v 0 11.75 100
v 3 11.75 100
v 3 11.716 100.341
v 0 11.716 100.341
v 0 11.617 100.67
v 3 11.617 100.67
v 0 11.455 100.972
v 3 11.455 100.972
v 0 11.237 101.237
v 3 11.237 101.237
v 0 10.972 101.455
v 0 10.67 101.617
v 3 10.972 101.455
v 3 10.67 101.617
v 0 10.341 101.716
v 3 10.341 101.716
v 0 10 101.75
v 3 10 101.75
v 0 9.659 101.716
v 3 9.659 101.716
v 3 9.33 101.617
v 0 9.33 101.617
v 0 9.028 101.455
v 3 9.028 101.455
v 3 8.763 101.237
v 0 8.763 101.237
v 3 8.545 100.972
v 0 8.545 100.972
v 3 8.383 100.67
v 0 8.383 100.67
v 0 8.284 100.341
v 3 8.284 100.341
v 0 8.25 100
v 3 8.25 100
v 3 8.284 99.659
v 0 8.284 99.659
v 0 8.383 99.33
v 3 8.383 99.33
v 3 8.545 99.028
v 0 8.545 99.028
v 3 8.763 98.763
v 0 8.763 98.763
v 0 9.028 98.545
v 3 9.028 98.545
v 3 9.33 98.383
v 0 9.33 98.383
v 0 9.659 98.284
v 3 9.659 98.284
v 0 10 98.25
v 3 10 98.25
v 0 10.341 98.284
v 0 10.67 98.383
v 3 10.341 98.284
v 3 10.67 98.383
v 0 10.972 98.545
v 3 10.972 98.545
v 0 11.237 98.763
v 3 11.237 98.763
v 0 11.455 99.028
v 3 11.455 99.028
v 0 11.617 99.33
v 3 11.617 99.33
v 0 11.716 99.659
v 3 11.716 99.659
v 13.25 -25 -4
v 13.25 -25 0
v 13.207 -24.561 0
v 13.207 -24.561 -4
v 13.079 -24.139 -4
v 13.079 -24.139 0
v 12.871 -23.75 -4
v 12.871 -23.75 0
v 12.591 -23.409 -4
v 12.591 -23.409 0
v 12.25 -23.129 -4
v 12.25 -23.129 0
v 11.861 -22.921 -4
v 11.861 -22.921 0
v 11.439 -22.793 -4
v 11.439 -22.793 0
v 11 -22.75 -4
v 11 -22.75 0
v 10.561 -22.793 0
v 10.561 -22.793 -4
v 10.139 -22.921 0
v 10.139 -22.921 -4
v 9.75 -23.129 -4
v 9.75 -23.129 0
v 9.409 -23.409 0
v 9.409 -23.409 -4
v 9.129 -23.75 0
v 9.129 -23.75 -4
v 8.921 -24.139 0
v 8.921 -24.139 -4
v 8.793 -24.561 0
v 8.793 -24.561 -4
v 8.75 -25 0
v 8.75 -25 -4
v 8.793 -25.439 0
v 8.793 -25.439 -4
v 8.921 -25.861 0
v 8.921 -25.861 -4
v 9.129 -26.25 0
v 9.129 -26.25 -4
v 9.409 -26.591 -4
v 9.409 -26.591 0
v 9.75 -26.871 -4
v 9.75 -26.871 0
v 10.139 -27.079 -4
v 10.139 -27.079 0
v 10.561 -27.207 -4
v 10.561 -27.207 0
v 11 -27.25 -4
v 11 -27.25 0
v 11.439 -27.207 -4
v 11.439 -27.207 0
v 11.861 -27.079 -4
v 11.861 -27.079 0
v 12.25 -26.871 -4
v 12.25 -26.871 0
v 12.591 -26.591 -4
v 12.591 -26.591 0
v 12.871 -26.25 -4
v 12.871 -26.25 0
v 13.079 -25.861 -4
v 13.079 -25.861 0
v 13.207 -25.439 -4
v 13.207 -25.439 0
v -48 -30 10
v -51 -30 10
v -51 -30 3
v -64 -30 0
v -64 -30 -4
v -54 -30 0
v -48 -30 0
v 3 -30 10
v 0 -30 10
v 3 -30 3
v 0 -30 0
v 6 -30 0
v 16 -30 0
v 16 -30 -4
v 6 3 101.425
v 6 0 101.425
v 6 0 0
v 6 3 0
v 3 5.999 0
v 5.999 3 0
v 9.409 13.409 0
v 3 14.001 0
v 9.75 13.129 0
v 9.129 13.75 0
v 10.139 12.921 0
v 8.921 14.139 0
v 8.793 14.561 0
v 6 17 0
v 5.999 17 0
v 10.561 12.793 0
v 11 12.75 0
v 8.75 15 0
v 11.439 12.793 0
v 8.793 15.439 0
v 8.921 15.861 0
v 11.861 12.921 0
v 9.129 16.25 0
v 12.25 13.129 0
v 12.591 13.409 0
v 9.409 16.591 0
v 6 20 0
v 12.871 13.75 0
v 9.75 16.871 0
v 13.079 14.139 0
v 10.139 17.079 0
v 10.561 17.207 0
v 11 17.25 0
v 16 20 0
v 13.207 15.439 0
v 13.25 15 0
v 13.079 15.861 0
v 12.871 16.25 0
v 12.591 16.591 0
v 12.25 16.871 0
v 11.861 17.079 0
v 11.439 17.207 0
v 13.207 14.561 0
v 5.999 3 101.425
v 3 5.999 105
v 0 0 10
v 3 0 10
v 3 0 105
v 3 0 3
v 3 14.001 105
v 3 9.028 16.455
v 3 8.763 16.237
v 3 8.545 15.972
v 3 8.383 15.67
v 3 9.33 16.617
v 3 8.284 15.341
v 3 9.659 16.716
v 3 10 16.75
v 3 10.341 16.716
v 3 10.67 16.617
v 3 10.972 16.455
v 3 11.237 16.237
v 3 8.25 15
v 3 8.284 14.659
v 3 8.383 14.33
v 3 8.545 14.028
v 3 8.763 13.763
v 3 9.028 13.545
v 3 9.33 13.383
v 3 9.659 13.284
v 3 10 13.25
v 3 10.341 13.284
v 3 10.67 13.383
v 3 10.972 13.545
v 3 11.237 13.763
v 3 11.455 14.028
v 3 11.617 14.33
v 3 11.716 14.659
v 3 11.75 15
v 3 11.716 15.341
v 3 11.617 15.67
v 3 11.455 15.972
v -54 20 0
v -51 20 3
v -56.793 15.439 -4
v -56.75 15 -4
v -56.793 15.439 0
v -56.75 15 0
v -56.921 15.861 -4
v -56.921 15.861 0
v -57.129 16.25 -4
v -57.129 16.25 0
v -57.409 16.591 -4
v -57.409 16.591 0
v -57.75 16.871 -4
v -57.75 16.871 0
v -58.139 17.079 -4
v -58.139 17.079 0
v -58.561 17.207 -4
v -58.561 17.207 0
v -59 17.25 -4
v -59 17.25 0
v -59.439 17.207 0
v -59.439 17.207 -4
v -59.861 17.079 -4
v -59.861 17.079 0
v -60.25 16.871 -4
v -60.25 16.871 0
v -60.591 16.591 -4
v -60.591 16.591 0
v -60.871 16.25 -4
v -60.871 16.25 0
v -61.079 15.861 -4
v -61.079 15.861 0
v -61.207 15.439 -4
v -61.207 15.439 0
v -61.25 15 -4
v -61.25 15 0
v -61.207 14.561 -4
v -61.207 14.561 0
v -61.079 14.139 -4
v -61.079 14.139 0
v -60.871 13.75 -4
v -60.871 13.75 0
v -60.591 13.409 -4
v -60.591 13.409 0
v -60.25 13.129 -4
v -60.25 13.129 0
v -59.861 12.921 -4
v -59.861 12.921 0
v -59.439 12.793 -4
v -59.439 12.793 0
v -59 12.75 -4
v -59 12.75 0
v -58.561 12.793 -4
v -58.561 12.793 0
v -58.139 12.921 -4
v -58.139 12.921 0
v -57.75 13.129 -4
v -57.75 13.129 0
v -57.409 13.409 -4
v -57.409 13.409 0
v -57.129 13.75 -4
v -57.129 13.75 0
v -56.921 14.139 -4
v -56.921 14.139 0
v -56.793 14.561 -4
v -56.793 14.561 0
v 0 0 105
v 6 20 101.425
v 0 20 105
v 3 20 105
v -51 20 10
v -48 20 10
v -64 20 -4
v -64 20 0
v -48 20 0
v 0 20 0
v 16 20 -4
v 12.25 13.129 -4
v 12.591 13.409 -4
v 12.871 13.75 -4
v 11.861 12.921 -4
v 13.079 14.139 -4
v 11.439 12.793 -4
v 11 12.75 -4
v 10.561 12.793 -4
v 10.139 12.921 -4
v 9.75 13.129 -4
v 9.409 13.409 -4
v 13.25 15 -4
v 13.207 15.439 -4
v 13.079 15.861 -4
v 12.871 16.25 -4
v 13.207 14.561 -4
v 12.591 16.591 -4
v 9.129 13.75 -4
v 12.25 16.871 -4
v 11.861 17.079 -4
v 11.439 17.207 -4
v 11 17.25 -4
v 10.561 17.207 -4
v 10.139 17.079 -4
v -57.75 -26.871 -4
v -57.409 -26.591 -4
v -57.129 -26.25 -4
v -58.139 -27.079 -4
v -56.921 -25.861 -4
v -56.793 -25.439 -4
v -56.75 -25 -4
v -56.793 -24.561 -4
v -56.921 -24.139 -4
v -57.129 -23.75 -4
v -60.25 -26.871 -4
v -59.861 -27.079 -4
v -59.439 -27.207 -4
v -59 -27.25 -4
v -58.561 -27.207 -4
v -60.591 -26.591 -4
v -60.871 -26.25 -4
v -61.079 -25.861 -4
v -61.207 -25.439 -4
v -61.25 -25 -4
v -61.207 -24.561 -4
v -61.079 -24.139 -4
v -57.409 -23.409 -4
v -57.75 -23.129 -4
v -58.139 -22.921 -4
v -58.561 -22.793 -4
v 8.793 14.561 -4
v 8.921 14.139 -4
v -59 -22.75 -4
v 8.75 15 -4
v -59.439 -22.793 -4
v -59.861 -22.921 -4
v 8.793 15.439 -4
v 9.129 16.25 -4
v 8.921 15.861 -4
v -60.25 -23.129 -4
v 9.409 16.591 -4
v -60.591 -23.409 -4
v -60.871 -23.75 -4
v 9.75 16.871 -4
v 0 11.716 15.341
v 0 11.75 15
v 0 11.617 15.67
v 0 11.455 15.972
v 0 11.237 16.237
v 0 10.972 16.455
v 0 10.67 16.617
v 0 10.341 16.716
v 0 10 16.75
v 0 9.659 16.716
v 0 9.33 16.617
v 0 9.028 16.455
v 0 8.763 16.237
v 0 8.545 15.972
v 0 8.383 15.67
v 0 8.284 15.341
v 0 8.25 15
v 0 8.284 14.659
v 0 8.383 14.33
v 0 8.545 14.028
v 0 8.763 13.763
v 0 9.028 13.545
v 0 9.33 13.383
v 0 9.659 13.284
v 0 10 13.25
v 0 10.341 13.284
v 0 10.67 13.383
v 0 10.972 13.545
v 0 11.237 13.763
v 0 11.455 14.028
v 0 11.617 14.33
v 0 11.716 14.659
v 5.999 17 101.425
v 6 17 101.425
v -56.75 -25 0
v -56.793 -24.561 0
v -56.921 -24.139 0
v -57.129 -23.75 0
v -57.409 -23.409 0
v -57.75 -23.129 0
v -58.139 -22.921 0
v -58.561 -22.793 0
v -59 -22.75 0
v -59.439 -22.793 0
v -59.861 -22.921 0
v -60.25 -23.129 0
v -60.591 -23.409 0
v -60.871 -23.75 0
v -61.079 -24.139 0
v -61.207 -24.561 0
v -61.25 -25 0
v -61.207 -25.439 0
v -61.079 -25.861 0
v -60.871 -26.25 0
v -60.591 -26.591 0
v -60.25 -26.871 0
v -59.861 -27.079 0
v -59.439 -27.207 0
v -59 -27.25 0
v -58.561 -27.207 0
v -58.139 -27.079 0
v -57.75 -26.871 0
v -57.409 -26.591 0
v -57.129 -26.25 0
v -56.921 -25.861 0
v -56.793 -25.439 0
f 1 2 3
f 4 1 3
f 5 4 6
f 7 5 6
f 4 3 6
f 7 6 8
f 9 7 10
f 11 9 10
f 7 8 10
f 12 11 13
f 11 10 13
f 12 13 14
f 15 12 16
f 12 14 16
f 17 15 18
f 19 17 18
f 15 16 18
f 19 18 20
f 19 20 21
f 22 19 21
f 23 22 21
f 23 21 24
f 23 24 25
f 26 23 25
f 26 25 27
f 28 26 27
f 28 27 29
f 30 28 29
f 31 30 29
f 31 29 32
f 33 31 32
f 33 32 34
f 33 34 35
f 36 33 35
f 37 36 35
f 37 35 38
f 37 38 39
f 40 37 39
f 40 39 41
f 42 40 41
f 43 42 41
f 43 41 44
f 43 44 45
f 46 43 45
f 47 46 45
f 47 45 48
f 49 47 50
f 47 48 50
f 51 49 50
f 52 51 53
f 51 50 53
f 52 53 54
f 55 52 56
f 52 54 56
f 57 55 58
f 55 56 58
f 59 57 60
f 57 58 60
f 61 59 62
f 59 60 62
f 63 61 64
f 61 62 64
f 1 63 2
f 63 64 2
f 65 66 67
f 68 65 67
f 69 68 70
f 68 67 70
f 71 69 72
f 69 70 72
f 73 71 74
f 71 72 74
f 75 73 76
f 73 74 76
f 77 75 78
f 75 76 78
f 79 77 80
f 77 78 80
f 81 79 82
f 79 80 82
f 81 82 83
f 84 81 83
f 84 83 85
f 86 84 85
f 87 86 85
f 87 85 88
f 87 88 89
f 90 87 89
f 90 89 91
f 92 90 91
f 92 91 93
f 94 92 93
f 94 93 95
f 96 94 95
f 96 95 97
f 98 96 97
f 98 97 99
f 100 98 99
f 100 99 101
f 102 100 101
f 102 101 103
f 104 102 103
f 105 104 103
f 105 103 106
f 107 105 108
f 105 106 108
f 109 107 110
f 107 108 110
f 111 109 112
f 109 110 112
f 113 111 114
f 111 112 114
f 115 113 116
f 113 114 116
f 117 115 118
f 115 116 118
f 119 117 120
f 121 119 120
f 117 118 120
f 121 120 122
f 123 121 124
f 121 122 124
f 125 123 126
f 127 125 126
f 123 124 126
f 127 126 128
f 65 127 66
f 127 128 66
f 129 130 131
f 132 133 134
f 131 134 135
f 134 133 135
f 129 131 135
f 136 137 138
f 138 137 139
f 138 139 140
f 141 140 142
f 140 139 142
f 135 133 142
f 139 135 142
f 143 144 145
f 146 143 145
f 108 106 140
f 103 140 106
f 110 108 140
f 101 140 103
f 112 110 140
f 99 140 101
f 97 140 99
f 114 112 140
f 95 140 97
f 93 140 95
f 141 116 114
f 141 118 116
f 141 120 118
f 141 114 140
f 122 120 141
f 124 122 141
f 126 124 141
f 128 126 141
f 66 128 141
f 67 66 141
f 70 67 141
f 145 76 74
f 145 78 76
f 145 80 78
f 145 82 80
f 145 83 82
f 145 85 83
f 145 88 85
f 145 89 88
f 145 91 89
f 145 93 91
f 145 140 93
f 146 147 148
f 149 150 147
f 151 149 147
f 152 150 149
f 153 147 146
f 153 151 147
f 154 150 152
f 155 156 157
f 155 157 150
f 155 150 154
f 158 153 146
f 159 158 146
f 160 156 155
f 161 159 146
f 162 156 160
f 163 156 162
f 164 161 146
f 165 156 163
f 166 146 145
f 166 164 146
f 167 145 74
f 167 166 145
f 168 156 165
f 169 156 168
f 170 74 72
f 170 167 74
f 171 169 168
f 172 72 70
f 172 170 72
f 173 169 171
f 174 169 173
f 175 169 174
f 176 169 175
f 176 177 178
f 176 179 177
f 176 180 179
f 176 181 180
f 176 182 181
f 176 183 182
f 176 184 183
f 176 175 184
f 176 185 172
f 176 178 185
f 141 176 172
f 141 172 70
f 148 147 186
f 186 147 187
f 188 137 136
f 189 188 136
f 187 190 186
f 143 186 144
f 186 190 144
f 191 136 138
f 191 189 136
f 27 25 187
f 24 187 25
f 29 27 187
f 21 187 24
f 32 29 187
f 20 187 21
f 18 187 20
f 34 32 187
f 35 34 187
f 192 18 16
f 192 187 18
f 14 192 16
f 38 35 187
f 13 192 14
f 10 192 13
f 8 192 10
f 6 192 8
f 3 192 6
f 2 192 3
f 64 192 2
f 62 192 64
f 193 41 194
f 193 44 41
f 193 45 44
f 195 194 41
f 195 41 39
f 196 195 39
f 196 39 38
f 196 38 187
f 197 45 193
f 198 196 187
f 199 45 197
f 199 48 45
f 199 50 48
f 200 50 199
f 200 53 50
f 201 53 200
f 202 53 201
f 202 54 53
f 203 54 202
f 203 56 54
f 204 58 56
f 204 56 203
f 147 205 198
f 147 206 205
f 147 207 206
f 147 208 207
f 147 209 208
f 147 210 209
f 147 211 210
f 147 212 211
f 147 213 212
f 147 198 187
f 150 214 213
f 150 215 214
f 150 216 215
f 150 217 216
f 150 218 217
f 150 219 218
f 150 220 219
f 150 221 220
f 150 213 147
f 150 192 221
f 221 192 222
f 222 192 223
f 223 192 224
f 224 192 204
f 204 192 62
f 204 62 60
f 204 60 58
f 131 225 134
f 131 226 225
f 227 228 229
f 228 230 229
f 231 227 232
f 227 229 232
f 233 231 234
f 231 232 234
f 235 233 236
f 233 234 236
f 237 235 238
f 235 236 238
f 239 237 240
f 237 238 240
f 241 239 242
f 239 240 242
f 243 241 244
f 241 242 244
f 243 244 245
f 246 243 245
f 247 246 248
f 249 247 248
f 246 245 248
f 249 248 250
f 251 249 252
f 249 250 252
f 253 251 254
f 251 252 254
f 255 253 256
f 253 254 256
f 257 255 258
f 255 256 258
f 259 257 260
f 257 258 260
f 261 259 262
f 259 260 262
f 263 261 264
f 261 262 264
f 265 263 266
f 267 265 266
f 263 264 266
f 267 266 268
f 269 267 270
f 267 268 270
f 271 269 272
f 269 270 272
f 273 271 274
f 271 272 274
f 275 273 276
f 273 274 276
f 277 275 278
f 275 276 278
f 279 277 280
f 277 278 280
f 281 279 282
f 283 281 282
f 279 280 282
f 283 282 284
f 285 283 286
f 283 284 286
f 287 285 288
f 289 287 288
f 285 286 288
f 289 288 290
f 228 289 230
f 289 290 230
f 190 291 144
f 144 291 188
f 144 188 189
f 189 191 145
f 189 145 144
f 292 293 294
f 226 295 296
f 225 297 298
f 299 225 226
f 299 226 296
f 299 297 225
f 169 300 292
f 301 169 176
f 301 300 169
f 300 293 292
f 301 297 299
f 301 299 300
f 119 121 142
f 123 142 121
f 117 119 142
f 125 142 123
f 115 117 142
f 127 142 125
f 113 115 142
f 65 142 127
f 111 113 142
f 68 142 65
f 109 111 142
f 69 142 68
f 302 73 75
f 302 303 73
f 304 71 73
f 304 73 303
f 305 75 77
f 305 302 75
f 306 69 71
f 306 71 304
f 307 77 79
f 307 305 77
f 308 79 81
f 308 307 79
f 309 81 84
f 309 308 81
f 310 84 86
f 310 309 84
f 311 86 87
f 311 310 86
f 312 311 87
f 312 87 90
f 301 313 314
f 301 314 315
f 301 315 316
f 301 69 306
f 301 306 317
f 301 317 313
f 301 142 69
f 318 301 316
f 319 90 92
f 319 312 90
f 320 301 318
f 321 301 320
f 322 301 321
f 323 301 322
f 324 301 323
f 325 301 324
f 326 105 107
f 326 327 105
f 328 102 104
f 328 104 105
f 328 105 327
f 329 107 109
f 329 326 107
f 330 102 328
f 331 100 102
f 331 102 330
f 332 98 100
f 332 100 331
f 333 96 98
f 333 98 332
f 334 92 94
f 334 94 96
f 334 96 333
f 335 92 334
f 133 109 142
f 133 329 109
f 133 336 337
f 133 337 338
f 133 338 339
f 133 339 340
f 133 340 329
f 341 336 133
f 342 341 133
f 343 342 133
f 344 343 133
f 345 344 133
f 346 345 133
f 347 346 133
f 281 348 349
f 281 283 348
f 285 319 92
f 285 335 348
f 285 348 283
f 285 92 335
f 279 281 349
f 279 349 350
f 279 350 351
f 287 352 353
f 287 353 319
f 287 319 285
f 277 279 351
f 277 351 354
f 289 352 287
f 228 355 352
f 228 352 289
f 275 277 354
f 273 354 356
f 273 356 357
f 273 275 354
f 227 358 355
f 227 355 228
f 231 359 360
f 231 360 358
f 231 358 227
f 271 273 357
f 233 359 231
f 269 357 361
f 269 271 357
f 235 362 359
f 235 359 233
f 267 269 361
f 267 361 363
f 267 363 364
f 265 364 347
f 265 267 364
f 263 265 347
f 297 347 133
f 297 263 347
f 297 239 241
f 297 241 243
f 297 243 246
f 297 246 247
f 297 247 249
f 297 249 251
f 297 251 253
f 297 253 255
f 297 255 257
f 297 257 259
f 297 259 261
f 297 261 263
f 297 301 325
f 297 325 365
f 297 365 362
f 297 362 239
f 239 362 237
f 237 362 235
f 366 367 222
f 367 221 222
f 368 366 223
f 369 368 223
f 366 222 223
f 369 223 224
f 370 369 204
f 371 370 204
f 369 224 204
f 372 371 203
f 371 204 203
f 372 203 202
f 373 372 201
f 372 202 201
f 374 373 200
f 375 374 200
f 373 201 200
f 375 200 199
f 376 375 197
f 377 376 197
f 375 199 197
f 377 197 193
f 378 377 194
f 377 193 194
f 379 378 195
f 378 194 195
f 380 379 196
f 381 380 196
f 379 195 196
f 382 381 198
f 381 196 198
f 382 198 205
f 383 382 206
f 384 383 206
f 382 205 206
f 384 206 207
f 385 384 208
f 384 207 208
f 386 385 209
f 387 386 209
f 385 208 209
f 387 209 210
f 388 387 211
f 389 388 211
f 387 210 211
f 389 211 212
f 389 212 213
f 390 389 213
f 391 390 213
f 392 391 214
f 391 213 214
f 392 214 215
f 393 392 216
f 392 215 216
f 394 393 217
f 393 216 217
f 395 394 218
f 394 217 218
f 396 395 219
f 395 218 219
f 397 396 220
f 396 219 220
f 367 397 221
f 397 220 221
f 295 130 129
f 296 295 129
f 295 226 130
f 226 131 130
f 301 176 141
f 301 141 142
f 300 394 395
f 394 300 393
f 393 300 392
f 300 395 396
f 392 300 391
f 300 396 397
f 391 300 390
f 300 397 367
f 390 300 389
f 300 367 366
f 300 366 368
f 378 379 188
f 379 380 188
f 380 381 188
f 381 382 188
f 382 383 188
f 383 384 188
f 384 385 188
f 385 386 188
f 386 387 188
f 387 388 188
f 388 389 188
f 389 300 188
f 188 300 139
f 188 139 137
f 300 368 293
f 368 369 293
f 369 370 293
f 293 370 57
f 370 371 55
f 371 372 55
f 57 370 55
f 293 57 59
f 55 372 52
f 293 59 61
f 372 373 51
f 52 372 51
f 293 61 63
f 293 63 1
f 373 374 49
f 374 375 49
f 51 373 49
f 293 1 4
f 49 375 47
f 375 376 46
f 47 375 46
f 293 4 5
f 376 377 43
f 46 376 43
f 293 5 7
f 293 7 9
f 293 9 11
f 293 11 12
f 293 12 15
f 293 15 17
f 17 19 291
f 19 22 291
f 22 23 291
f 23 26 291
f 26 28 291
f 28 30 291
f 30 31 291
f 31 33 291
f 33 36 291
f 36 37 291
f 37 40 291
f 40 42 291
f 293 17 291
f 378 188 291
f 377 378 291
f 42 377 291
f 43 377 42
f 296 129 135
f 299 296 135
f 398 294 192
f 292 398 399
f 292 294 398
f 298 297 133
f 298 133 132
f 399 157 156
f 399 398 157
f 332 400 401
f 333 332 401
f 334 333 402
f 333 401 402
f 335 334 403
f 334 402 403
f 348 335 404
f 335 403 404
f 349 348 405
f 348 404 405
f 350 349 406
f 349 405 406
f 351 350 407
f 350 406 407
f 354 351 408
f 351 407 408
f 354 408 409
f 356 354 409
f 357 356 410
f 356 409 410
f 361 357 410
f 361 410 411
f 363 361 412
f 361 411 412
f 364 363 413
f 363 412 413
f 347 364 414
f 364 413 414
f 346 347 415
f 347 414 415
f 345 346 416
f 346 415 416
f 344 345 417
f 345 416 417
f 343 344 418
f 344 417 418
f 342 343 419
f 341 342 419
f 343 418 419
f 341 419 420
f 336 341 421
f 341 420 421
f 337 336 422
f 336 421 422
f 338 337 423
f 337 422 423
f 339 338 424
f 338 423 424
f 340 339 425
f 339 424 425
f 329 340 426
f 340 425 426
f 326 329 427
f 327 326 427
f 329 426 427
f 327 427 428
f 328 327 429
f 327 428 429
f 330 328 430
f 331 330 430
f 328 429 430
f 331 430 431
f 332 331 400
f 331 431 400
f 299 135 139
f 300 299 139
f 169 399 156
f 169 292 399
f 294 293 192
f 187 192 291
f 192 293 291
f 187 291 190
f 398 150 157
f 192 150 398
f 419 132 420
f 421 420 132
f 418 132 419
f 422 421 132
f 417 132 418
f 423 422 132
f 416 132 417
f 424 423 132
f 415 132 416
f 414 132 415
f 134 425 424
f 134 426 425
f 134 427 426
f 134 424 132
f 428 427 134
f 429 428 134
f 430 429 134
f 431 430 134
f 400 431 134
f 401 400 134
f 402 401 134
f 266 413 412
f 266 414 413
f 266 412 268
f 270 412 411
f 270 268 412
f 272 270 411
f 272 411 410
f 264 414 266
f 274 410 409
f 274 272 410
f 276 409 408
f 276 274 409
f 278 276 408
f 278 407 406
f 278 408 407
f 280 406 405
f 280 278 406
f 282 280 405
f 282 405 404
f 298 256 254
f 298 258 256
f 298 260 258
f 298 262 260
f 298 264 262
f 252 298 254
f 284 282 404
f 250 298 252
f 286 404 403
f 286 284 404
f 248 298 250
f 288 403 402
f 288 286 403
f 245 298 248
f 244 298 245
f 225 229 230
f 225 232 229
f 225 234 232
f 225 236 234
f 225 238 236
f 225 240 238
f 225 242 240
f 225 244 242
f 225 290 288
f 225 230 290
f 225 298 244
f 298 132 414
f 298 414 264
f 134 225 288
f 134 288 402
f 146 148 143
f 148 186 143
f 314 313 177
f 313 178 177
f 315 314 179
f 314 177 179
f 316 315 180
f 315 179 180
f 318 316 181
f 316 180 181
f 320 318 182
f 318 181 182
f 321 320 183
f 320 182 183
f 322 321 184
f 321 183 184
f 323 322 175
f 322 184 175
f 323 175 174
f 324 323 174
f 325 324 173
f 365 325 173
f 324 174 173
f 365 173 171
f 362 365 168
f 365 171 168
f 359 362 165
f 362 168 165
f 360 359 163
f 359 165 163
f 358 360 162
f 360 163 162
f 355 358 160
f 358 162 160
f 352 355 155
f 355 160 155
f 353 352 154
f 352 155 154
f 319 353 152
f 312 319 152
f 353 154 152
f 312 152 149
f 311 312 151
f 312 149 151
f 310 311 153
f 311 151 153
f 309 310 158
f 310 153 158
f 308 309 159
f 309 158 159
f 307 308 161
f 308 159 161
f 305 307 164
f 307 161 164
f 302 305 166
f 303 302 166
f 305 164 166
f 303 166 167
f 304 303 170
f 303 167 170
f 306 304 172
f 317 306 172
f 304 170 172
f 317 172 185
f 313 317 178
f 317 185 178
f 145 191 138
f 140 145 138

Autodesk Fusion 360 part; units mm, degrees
sketch "Sketch1" plane through (0, 0, 0) normal (0, 1, 0) x (1, 0, 0)
  line L0 (0, 0) -> (-48, 0) construction
  line L1 (-48, 0) -> (-48, -115) construction
  line L2 (-48, -115) -> (0, -115) construction
  line L3 (0, -115) -> (0, 0) construction
  line L4 (0, -105) -> (3, -105)
  line L5 (3, -105) -> (3, 0)
  line L6 (3, 0) -> (16, 0)
  line L7 (16, 0) -> (16, 4)
  line L8 (16, 4) -> (-64, 4)
  line L9 (-64, 4) -> (-64, 0)
  line L10 (-64, 0) -> (-51, 0)
  line L11 (-51, 0) -> (-51, -10)
  line L12 (-51, -10) -> (-48, -10)
  line L13 (-48, -10) -> (-48, 0)
  line L14 (-48, 0) -> (0, 0)
  line L15 (0, 0) -> (0, -105)
  line L16 (0, -100) -> (3, -100) construction
  line L17 (3, -15) -> (0, -14.9007) construction
  line L18 (-51, 0) -> (-48, 0)
  line L19 (0, 0) -> (3, 0)
  line L20 (3, -105) -> (6, -101.4247)
  line L21 (6, -101.4247) -> (6, 0)
  line L22 (0, -10) -> (3, -10)
  dimension "d1" = 48
  dimension "d2" = 115
  dimension "d3" = 3
  dimension "d4" = 4
  dimension "d6" = 13
  dimension "d7" = 13
  dimension "d8" = 10
  dimension "d9" = 15
  dimension "d10" = 85
  dimension "d11" = 5
  dimension "d16" = 3
  dimension "d17" = 140
extrude "Extrude1" add sketch "Sketch1" along normal blind 20 contours L4 L5 L15 L22 | L5 L15 L19 L22 | L6 L7 L8 L9 L10 L14 L18 L19 | L11 L12 L13 L18
extrude "Extrude2" add sketch "Sketch1" against normal blind 30 contours L6 L7 L8 L9 L10 L14 L18 L19
extrude "Extrude3" add sketch "Sketch1" against normal blind 30 contours L5 L15 L19 L22 | L11 L12 L13 L18
sketch "Sketch2" plane through (3, 0, 0) normal (1, 0, 0) x (0, 1, 0)
  line L0 (0, 105) -> (0, 10)
  line L1 (0, 10) -> (-30, 10)
  line L2 (-30, 10) -> (-30, 0)
  line L3 (-30, 0) -> (20, 0)
  line L4 (20, 0) -> (20, 105)
  line L5 (20, 105) -> (0, 105)
  line L6 (10, 105) -> (10, 0) construction
  circle A0 centre (10, 15) radius 1.75
  circle A1 centre (10, 100) radius 1.75
  dimension "d21" = 15
  dimension "d22" = 85
  dimension "d23" = 3.5
extrude "Extrude4" cut sketch "Sketch2" against normal blind 12 contours A0 | A1
extrude "Extrude5" add sketch "Sketch1" along normal blind 3 contours L5 L6 L20 L21
chamfer "Chamfer1" distance 3 angle 45 1 edges at (3, 3, 52.5)
chamfer "Chamfer2" distance 3 angle 45 1 edges at (3, -15, 0)
chamfer "Chamfer3" distance 3 angle 45 1 edges at (-51, -5, 0)
extrude "Extrude6" add sketch "Sketch1" against normal blind 3 from surface at 20 contours L5 L6 L20 L21
chamfer "Chamfer4" distance 3 angle 45 1 edges at (3, 17, 52.5)
sketch "Sketch3" plane through (0, 0, 0) normal (0, 0, 1) x (1, 0, 0)
  line L0 (11, -25) -> (-59, -25) construction
  line L1 (-59, -25) -> (-59, 15) construction
  line L2 (-59, 15) -> (11, 15) construction
  line L3 (11, 15) -> (11, -25) construction
  circle A0 centre (11, -25) radius 2.25
  circle A1 centre (-59, -25) radius 2.25
  circle A2 centre (-59, 15) radius 2.25
  circle A3 centre (11, 15) radius 2.25
  circle A4 centre (11, 15) radius 5 construction
  circle A5 centre (11, -25) radius 5 construction
  circle A6 centre (-59, 15) radius 5 construction
  circle A7 centre (-59, -25) radius 5 construction
  line L4 (-64, -5) -> (20.2305, -5) construction
  line L5 (-64, -30) -> (-64, 20) construction
  line L6 (-24, 20) -> (-24, -32.4373) construction
  line L7 (-48, 20) -> (0, 20) construction
  dimension "d35" = 4.5
  dimension "d36" = 10
  dimension "d37" = 40
  dimension "d38" = 70
extrude "Extrude7" cut sketch "Sketch3" against normal blind 17
equation "d21 = d9"
equation "d22 = d10"
